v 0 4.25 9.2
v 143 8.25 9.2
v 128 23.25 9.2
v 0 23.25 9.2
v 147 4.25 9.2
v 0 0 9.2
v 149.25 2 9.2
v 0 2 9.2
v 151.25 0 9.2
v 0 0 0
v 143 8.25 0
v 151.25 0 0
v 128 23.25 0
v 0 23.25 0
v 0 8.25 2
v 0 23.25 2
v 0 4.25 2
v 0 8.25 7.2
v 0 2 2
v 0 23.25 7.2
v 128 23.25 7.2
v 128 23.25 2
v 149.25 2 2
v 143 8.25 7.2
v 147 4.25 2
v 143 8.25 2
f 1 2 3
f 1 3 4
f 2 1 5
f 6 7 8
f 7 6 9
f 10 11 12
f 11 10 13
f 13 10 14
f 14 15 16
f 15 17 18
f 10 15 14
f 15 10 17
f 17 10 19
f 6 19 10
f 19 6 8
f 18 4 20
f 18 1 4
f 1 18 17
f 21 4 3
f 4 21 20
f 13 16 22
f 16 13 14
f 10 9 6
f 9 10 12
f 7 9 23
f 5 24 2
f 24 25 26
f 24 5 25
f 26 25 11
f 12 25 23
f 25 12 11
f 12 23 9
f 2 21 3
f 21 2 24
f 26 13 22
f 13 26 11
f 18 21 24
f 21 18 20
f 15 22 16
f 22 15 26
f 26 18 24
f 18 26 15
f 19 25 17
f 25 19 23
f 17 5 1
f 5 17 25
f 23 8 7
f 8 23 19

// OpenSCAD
// file: _common.scad
$fa=4; // default minimum facet angle is now 0.5
$fs=0.05; // defaul

wallThickness = 2;
caseWidth = 120;
caseHeight = 50;
caseDepth = 75;

ledStripWidth = 11;

sideLen = 203;

dioramaWidth = caseWidth + 1 + wallThickness * 2;

bottomHeight = caseHeight + 10;

backDepth = 10;

acrylicThickness = 2.25;
woodThickness = 5.2;
// main file
include <_common.scad>

edgeLen = sideLen - bottomHeight;
edgeWidth = 15;

difference() {
  cube([edgeLen + edgeWidth, edgeWidth + wallThickness * 3 + acrylicThickness, woodThickness + wallThickness * 2]);
  translate([edgeLen, wallThickness * 3 + acrylicThickness, -.5]) rotate([0, 0, -45]) cube([edgeWidth * 2, edgeWidth, woodThickness + wallThickness * 2 + 1]);
  translate([edgeLen, wallThickness * 3 + acrylicThickness, -.5]) rotate([0, 0, 45]) cube([edgeWidth, edgeWidth * 2, woodThickness + wallThickness * 2 + 1]);
  translate([edgeLen, wallThickness * 3 + acrylicThickness, -.5]) cube([edgeWidth + .1, edgeWidth + .1, woodThickness + wallThickness * 2 + 1]);
  translate([-.5, wallThickness * 3 + acrylicThickness, wallThickness]) cube([edgeLen + 1, edgeWidth + wallThickness + .1, woodThickness]);
  translate([-.5, wallThickness, wallThickness]) cube([edgeLen + edgeWidth + 1, acrylicThickness, woodThickness + wallThickness + .1]);
}
